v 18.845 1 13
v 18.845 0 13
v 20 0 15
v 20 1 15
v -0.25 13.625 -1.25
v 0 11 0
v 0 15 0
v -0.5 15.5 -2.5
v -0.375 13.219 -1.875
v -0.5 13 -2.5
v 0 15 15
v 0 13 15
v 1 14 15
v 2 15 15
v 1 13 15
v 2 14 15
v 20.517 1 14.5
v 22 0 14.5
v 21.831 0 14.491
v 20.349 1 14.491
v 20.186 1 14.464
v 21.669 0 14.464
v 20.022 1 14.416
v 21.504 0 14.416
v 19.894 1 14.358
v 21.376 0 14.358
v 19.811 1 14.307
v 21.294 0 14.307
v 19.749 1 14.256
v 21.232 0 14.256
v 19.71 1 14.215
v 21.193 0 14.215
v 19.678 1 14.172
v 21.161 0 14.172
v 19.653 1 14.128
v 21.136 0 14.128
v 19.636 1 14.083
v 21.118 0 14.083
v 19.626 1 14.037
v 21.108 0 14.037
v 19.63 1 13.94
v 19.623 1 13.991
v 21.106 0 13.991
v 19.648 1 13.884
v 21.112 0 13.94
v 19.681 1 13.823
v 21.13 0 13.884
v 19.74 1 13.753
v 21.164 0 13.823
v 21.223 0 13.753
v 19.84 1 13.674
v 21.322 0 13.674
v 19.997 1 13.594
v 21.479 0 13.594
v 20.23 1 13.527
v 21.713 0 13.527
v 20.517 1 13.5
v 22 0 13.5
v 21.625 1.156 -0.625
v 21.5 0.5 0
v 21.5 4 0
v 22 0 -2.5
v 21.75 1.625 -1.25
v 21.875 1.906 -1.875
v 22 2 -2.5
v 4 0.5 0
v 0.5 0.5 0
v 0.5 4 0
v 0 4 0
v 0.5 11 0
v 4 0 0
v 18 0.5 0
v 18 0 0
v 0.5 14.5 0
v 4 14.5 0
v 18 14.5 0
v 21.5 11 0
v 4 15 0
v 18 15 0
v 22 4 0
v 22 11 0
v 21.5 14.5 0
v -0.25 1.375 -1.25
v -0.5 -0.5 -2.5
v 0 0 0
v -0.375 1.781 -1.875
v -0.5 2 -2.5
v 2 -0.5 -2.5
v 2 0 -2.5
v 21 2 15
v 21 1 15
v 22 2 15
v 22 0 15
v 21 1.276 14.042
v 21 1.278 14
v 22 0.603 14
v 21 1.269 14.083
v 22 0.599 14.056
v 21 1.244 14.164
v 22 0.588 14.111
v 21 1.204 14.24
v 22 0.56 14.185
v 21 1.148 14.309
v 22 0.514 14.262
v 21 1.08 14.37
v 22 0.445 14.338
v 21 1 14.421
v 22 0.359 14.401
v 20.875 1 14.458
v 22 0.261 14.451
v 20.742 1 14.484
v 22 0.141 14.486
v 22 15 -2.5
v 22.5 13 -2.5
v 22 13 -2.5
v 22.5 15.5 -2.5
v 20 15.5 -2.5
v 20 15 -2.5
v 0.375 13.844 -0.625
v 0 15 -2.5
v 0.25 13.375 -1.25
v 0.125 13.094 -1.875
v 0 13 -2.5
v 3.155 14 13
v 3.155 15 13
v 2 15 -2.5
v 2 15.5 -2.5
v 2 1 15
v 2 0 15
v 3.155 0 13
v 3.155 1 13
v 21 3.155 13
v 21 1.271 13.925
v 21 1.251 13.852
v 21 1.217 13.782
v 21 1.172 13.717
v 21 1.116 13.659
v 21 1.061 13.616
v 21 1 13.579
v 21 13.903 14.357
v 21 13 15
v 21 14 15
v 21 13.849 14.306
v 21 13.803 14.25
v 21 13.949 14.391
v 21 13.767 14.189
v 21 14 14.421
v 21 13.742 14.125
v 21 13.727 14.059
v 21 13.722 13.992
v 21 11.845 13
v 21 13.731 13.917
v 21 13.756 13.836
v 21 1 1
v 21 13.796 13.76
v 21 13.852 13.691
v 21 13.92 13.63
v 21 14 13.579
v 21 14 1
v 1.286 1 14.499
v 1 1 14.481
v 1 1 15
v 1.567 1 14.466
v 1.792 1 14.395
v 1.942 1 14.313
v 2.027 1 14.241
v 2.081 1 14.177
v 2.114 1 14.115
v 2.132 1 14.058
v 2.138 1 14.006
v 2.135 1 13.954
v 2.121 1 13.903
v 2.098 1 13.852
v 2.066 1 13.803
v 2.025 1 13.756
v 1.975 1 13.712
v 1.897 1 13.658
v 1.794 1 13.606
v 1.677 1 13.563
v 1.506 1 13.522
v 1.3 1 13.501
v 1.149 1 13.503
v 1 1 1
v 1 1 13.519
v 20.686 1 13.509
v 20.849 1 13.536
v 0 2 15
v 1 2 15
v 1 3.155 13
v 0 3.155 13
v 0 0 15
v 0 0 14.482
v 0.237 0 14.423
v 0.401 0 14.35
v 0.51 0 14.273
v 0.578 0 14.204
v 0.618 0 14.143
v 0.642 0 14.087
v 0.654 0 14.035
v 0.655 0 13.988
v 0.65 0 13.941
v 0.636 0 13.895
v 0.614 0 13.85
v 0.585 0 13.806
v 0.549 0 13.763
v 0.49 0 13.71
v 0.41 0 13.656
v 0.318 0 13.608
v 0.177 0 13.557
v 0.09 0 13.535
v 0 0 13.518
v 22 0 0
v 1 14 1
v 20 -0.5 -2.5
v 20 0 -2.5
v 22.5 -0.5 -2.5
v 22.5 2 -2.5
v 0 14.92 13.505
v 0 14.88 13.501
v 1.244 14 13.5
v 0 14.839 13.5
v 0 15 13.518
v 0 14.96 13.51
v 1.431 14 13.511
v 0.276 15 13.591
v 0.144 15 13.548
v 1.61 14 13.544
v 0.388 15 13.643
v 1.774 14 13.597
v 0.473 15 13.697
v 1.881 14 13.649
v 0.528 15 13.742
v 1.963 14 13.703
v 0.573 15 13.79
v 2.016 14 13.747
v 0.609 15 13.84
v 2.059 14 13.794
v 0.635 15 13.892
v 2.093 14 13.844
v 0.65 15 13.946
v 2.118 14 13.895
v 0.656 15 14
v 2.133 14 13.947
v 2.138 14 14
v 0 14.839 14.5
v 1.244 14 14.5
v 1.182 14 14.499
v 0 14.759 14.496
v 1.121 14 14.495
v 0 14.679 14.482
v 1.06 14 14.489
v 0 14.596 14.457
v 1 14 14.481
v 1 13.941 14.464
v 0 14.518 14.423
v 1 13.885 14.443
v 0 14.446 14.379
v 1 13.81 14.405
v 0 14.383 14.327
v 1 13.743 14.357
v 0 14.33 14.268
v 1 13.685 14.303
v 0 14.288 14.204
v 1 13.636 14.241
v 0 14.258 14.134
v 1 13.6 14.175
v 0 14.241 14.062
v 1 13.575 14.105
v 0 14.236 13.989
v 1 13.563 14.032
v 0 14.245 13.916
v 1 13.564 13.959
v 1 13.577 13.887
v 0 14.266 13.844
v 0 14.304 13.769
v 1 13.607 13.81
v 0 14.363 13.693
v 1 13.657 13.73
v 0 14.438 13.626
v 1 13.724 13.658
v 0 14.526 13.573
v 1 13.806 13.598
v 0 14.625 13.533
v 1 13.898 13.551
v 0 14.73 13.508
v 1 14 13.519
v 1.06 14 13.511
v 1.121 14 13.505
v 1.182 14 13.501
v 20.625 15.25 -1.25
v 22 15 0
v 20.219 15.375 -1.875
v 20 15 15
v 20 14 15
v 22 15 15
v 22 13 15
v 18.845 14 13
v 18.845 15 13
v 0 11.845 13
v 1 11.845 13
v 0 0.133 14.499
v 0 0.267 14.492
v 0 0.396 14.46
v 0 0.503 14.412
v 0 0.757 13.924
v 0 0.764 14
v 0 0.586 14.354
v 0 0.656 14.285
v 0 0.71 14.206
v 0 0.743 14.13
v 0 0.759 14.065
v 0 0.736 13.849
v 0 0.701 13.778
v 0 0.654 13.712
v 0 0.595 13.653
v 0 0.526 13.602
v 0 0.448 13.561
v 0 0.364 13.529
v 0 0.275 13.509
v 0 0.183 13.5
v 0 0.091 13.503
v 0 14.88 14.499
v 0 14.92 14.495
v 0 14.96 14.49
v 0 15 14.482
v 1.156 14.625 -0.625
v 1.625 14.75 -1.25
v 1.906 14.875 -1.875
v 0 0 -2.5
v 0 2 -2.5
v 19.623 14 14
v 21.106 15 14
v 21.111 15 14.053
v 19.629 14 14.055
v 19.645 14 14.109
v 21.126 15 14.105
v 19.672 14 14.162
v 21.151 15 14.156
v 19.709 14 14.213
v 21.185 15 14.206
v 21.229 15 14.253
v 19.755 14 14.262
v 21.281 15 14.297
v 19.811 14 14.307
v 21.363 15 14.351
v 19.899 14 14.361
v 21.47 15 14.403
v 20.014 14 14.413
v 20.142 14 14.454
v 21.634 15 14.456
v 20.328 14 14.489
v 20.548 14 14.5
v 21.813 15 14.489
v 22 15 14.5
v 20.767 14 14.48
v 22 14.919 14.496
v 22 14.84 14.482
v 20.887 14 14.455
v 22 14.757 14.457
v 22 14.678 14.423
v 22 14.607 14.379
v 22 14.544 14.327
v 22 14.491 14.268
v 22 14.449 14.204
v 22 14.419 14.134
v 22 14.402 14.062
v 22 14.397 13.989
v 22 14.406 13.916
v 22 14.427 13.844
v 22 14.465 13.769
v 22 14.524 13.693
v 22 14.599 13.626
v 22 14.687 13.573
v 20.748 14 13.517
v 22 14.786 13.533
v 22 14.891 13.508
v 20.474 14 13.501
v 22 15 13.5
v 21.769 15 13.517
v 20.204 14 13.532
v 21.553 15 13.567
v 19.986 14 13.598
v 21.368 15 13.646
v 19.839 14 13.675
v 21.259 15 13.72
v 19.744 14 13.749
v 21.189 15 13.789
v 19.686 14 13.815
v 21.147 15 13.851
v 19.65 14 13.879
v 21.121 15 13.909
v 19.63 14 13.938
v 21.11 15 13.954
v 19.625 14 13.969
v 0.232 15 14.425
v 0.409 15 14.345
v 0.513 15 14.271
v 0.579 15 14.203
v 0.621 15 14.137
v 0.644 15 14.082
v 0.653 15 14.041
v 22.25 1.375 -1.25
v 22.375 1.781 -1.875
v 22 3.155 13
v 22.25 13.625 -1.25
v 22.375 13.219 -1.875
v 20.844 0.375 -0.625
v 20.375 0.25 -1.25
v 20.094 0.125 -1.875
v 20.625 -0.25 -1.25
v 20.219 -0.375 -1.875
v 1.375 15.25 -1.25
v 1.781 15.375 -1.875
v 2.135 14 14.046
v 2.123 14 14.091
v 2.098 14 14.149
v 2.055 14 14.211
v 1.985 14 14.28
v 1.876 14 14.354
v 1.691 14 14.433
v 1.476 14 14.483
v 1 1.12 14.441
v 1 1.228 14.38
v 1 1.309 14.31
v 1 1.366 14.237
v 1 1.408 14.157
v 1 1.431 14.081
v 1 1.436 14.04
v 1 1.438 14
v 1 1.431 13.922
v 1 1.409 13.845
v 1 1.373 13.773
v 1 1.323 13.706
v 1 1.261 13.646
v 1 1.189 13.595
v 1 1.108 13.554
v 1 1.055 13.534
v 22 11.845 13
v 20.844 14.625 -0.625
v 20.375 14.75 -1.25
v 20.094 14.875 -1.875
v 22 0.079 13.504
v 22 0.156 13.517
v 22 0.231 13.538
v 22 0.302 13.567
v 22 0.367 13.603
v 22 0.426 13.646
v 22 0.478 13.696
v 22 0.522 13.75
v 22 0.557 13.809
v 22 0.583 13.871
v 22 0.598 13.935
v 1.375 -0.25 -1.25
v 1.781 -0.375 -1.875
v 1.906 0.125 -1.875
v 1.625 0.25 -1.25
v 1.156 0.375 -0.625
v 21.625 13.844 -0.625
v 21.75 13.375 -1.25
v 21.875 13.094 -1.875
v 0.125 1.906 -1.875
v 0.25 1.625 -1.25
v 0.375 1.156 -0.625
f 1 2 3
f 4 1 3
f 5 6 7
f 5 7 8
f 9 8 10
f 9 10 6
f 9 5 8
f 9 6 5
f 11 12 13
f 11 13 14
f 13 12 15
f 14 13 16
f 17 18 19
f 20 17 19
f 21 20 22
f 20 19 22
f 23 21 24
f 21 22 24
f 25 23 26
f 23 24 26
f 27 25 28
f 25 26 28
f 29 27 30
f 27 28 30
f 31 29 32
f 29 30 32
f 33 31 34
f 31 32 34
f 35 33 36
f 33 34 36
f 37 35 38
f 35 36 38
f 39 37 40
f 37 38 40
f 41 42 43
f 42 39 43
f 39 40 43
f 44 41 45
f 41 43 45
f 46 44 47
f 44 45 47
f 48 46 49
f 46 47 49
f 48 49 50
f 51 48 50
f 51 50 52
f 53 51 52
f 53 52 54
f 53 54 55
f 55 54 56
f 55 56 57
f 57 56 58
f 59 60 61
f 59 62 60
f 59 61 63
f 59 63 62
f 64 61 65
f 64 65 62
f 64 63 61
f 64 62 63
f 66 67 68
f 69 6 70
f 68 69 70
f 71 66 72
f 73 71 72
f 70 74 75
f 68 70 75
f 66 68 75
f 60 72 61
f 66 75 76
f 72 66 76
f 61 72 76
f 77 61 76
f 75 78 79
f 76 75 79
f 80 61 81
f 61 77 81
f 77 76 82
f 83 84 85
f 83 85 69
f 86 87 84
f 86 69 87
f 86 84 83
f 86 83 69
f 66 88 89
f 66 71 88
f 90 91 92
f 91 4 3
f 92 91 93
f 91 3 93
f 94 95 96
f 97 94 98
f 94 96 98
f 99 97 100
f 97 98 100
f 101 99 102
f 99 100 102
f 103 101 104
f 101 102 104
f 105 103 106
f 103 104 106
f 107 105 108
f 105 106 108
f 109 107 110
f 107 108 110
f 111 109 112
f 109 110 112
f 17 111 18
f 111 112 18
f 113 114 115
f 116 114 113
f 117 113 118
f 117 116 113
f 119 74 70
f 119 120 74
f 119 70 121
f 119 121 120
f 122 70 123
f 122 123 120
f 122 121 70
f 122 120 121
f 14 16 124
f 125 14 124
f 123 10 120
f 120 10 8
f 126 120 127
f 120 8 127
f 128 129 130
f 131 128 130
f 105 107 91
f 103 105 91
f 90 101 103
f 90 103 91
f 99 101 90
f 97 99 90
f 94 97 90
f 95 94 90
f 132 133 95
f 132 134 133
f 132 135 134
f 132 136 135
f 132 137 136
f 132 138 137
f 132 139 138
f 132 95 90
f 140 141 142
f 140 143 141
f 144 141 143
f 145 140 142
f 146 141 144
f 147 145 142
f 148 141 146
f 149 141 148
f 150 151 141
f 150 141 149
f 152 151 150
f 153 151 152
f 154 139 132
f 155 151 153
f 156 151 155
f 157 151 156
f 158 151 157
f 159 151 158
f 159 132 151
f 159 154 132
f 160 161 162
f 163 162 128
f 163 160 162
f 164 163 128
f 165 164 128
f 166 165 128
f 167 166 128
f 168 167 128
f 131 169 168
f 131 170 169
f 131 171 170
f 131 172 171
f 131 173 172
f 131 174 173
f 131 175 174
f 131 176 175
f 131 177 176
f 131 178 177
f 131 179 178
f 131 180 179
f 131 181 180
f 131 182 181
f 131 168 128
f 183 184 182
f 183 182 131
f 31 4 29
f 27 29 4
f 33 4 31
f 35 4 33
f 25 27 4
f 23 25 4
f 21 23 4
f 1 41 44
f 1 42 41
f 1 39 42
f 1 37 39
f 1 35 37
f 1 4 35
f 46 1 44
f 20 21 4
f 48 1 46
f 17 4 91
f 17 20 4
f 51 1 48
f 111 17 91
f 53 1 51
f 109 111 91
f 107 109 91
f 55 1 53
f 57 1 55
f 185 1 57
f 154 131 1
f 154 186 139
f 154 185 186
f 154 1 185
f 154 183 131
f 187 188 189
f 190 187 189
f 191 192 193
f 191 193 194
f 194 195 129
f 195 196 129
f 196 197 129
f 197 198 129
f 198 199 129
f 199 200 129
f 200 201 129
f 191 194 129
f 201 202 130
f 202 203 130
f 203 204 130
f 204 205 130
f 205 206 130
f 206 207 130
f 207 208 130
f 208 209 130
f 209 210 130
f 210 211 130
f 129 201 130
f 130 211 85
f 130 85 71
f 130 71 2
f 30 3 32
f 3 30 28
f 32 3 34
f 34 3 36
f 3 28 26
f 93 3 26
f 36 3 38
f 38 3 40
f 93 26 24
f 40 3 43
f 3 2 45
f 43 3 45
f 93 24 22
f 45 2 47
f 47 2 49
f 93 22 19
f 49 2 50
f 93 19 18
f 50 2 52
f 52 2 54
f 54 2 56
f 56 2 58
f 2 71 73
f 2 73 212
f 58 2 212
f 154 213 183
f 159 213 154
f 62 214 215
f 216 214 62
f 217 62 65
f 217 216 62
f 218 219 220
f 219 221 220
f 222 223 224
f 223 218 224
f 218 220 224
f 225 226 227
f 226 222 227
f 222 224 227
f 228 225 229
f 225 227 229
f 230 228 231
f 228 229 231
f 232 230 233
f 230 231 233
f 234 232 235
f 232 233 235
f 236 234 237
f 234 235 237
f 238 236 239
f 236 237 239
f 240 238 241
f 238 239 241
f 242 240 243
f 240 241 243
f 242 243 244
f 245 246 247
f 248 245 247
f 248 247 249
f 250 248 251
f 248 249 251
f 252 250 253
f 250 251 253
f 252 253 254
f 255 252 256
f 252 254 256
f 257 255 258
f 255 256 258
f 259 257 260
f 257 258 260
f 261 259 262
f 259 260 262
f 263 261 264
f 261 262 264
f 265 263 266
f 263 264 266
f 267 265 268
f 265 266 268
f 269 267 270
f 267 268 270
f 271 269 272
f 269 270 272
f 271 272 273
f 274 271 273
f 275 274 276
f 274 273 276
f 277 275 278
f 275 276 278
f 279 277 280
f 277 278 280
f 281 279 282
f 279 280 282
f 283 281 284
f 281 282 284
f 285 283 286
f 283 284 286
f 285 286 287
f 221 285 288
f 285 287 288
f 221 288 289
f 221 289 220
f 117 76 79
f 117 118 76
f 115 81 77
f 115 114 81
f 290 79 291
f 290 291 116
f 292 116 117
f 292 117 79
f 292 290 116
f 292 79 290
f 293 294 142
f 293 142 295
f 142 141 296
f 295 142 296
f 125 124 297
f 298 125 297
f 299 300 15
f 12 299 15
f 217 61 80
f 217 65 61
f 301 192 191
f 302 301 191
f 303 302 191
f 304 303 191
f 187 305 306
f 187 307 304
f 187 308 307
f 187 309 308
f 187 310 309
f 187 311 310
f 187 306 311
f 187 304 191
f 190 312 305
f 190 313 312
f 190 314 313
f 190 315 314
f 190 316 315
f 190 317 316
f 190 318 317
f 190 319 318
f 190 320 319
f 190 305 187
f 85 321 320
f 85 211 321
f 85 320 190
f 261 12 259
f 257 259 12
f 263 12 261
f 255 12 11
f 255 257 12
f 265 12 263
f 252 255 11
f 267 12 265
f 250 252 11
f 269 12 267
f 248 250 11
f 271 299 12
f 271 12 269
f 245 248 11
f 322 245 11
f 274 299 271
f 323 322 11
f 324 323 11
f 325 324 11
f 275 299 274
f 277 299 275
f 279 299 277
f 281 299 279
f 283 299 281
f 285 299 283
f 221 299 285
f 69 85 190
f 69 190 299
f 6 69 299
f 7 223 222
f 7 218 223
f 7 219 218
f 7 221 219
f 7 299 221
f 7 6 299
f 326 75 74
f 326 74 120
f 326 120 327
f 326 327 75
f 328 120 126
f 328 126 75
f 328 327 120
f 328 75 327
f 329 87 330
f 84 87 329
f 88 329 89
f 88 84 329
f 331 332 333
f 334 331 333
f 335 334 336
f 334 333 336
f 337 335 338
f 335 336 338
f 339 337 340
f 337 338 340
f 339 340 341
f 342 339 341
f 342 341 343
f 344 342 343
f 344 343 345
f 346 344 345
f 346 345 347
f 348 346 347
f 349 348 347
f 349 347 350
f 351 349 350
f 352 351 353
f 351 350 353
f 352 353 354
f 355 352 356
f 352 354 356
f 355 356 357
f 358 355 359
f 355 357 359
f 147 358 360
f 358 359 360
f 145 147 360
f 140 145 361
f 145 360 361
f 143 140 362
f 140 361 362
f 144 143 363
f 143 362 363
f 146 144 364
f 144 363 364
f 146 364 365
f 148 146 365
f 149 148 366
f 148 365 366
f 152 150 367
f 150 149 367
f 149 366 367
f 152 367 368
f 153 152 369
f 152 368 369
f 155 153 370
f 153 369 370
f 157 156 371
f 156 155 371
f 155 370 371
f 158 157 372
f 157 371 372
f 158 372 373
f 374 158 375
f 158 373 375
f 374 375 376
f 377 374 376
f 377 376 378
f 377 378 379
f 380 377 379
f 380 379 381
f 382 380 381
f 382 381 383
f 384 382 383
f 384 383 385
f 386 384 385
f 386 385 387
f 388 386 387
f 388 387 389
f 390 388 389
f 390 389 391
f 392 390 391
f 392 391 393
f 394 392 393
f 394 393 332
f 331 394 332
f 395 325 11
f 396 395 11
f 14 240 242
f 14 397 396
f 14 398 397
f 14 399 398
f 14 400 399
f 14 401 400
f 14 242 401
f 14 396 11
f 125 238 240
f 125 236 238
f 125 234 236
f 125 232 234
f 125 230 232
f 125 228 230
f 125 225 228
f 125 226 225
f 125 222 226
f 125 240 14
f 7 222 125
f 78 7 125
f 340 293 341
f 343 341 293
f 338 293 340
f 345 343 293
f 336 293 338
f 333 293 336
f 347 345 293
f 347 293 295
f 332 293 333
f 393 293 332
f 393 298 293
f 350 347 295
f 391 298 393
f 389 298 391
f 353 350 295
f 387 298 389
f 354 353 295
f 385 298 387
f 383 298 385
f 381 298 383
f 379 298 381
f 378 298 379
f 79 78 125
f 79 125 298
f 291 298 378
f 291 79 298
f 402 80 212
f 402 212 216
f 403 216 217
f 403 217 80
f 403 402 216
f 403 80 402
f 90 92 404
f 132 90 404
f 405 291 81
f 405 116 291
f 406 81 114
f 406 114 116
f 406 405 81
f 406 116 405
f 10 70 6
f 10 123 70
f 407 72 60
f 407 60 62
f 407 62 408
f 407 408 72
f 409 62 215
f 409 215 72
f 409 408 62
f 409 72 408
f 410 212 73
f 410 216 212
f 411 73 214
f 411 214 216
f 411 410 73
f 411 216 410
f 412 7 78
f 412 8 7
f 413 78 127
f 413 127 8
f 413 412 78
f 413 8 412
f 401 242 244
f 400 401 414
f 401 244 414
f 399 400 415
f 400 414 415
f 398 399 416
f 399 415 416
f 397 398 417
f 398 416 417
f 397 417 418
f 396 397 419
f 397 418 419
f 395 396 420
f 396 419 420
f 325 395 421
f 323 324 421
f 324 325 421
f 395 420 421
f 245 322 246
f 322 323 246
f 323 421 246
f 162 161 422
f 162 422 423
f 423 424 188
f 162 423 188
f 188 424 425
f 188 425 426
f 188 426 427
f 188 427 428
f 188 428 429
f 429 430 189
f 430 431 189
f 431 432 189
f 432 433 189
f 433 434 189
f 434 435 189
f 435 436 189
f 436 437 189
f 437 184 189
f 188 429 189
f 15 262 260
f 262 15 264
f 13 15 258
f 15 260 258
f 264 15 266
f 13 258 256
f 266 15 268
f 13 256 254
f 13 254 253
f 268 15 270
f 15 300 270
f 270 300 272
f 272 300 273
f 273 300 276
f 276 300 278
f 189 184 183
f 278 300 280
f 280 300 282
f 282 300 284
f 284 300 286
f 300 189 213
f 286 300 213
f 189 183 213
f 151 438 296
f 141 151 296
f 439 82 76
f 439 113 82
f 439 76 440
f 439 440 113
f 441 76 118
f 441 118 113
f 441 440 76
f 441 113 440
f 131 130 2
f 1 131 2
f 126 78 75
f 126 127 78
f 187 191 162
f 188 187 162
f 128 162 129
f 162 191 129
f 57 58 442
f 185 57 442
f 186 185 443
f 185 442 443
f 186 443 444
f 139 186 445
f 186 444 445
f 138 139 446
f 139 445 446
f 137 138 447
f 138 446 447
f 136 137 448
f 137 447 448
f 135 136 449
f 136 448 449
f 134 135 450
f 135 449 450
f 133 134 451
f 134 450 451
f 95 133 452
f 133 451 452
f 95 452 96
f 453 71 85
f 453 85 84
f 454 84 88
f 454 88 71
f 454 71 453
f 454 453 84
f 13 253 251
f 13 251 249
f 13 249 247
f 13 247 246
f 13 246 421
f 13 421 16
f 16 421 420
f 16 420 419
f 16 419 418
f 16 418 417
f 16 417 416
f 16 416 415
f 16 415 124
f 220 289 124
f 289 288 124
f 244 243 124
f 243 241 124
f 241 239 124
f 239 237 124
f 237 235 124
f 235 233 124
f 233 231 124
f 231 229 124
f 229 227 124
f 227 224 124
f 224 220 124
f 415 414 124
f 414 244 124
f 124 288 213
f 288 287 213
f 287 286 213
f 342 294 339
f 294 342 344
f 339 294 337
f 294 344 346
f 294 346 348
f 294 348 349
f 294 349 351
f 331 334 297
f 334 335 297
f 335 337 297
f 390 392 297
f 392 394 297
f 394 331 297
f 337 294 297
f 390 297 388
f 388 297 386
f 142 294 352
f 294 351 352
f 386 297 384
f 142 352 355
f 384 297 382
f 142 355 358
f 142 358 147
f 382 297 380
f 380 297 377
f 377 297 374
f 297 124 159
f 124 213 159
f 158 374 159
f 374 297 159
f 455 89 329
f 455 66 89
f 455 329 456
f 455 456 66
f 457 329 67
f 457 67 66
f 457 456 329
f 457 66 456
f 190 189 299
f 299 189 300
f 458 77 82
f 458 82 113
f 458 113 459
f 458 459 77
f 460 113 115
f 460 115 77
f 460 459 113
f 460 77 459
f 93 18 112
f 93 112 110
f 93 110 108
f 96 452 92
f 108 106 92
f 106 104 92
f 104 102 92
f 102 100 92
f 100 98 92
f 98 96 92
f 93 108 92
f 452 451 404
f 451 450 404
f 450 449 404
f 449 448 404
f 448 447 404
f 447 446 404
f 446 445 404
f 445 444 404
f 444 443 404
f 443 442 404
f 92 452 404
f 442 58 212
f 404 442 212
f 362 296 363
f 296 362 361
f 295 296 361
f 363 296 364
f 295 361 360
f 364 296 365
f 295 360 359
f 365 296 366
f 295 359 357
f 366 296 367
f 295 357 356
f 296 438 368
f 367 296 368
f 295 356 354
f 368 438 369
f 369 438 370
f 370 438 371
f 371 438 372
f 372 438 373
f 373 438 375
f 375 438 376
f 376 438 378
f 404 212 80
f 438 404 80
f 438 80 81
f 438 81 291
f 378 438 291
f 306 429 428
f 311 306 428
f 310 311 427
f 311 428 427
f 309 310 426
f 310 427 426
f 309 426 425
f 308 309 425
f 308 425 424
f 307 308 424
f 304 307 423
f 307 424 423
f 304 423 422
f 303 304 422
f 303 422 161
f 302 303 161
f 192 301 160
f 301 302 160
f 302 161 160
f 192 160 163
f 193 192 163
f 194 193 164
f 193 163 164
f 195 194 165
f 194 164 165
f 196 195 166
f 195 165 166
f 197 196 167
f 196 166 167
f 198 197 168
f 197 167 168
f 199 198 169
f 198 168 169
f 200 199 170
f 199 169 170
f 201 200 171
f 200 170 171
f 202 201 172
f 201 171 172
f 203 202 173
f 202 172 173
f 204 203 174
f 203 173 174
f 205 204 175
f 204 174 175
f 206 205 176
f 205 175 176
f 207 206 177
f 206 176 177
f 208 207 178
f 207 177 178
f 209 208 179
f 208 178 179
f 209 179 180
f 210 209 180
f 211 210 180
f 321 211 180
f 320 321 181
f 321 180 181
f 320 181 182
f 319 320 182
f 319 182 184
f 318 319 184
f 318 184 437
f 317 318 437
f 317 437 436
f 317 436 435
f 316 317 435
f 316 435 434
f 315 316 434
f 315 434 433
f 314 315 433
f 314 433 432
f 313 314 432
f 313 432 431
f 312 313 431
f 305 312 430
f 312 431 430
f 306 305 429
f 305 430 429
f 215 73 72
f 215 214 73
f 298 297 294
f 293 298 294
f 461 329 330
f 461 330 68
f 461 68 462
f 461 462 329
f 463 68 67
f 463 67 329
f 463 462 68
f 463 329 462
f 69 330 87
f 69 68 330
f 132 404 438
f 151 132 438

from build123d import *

# Parameters (mm, degrees)
F0_W      = 22
F0_H      = 15
F1_DEPTH  = 18
F2_T      = -1
F11_DEPTH = 25
F13_DEPTH = 25
F16_R     = 0.5
F17_DEPTH = 50
F20_DEPTH = 50


with BuildPart() as f1:
    # F0 (on Top) → F1 (new body)
    with BuildSketch(Plane.XY):
        with Locations((11, 7.5)):
            Rectangle(F0_W, F0_H)
    extrude(amount=F1_DEPTH)

    # F2
    f2_openings = [f1.faces().sort_by_distance(p)[0] for p in [
        (11, 7.5, 18),
    ]]
    offset(amount=F2_T, openings=f2_openings)

    # F5 (on offset) → F6 section 0
    with BuildSketch(Plane.XY.offset(-2.5)):
        Polygon((-0.5, 2), (-0.5, -0.5), (2, -0.5), (2, 0), (0, 0), (0, 2), align=None)
    # F3 (on face) → F6 section 1
    with BuildSketch(Plane(origin=(0, 0, 0), x_dir=(1, 0, 0), z_dir=(0, 0, -1))):
        Polygon((4, 0), (0, 0), (0, -4), (0.5, -4), (0.5, -0.5), (4, -0.5), align=None)
    loft()

    # F3 (on face) → F7 section 0
    with BuildSketch(Plane(origin=(0, 0, 0), x_dir=(1, 0, 0), z_dir=(0, 0, -1))):
        Polygon((0.5, -11), (0, -11), (0, -15), (4, -15), (4, -14.5), (0.5, -14.5), align=None)
    # F5 (on offset) → F7 section 1
    with BuildSketch(Plane.XY.offset(-2.5)):
        Polygon((-0.5, 13), (0, 13), (0, 15), (2, 15), (2, 15.5), (-0.5, 15.5), align=None)
    loft()

    # F3 (on face) → F8 section 0
    with BuildSketch(Plane(origin=(0, 0, 0), x_dir=(1, 0, 0), z_dir=(0, 0, -1))):
        Polygon((22, -15), (22, -11), (21.5, -11), (21.5, -14.5), (18, -14.5), (18, -15), align=None)
    # F5 (on offset) → F8 section 1
    with BuildSketch(Plane.XY.offset(-2.5)):
        Polygon((20, 15.5), (20, 15), (22, 15), (22, 13), (22.5, 13), (22.5, 15.5), align=None)
    loft()

    # F3 (on face) → F9 section 0
    with BuildSketch(Plane(origin=(0, 0, 0), x_dir=(1, 0, 0), z_dir=(0, 0, -1))):
        Polygon((22, 0), (18, 0), (18, -0.5), (21.5, -0.5), (21.5, -4), (22, -4), align=None)
    # F5 (on offset) → F9 section 1
    with BuildSketch(Plane.XY.offset(-2.5)):
        Polygon((22, 2), (22, 0), (20, 0), (20, -0.5), (22.5, -0.5), (22.5, 2), align=None)
    loft()

    # F10 (on face) → F11 (cut)
    with BuildSketch(Plane.XZ):
        Polygon((20, 15), (22, 15), (22, 18), (0, 18), (0, 15), (2, 15), (3.1547005384, 13), (18.8452994616, 13), align=None)
    extrude(amount=-F11_DEPTH, mode=Mode.SUBTRACT)

    # F12 (on face) → F13 (cut)
    with BuildSketch(Plane.YZ.offset(22)):
        Polygon((13, 15), (2, 15), (3.1547005384, 13), (11.8452994616, 13), align=None)
    extrude(amount=-F13_DEPTH, mode=Mode.SUBTRACT)

    # F16 (on face) → F17 (cut)
    with BuildSketch(Plane(origin=(22.0745514368, 14.8894729496, 0), x_dir=(-0.5591929035, 0.8290375726, 0), z_dir=(0.8290375726, 0.5591929035, 0))):
        with Locations((0.133319712, 14)):
            Circle(F16_R)
    extrude(amount=-F17_DEPTH, mode=Mode.SUBTRACT)

    # F19 (on face) → F20 (cut)
    with BuildSketch(Plane(origin=(15.1206725276, -10.1990224002, 0), x_dir=(0.5591929035, 0.8290375726, 0), z_dir=(0.8290375726, -0.5591929035, 0))):
        with BuildLine():
            ThreePointArc((12.8022438764, 14), (12.6557972669, 14.3535533906), (12.3022438764, 14.5))
            Line((12.3022438764, 14.5), (12.3022438764, 13.5))
            ThreePointArc((12.3022438764, 13.5), (12.6557972669, 13.6464466094), (12.8022438764, 14))
        make_face()
        with BuildLine():
            Line((12.3022438764, 13.5), (12.3022438764, 14.5))
            ThreePointArc((12.3022438764, 14.5), (11.8022438764, 14), (12.3022438764, 13.5))
        make_face()
    extrude(amount=-F20_DEPTH, mode=Mode.SUBTRACT)


solid = f1.part
